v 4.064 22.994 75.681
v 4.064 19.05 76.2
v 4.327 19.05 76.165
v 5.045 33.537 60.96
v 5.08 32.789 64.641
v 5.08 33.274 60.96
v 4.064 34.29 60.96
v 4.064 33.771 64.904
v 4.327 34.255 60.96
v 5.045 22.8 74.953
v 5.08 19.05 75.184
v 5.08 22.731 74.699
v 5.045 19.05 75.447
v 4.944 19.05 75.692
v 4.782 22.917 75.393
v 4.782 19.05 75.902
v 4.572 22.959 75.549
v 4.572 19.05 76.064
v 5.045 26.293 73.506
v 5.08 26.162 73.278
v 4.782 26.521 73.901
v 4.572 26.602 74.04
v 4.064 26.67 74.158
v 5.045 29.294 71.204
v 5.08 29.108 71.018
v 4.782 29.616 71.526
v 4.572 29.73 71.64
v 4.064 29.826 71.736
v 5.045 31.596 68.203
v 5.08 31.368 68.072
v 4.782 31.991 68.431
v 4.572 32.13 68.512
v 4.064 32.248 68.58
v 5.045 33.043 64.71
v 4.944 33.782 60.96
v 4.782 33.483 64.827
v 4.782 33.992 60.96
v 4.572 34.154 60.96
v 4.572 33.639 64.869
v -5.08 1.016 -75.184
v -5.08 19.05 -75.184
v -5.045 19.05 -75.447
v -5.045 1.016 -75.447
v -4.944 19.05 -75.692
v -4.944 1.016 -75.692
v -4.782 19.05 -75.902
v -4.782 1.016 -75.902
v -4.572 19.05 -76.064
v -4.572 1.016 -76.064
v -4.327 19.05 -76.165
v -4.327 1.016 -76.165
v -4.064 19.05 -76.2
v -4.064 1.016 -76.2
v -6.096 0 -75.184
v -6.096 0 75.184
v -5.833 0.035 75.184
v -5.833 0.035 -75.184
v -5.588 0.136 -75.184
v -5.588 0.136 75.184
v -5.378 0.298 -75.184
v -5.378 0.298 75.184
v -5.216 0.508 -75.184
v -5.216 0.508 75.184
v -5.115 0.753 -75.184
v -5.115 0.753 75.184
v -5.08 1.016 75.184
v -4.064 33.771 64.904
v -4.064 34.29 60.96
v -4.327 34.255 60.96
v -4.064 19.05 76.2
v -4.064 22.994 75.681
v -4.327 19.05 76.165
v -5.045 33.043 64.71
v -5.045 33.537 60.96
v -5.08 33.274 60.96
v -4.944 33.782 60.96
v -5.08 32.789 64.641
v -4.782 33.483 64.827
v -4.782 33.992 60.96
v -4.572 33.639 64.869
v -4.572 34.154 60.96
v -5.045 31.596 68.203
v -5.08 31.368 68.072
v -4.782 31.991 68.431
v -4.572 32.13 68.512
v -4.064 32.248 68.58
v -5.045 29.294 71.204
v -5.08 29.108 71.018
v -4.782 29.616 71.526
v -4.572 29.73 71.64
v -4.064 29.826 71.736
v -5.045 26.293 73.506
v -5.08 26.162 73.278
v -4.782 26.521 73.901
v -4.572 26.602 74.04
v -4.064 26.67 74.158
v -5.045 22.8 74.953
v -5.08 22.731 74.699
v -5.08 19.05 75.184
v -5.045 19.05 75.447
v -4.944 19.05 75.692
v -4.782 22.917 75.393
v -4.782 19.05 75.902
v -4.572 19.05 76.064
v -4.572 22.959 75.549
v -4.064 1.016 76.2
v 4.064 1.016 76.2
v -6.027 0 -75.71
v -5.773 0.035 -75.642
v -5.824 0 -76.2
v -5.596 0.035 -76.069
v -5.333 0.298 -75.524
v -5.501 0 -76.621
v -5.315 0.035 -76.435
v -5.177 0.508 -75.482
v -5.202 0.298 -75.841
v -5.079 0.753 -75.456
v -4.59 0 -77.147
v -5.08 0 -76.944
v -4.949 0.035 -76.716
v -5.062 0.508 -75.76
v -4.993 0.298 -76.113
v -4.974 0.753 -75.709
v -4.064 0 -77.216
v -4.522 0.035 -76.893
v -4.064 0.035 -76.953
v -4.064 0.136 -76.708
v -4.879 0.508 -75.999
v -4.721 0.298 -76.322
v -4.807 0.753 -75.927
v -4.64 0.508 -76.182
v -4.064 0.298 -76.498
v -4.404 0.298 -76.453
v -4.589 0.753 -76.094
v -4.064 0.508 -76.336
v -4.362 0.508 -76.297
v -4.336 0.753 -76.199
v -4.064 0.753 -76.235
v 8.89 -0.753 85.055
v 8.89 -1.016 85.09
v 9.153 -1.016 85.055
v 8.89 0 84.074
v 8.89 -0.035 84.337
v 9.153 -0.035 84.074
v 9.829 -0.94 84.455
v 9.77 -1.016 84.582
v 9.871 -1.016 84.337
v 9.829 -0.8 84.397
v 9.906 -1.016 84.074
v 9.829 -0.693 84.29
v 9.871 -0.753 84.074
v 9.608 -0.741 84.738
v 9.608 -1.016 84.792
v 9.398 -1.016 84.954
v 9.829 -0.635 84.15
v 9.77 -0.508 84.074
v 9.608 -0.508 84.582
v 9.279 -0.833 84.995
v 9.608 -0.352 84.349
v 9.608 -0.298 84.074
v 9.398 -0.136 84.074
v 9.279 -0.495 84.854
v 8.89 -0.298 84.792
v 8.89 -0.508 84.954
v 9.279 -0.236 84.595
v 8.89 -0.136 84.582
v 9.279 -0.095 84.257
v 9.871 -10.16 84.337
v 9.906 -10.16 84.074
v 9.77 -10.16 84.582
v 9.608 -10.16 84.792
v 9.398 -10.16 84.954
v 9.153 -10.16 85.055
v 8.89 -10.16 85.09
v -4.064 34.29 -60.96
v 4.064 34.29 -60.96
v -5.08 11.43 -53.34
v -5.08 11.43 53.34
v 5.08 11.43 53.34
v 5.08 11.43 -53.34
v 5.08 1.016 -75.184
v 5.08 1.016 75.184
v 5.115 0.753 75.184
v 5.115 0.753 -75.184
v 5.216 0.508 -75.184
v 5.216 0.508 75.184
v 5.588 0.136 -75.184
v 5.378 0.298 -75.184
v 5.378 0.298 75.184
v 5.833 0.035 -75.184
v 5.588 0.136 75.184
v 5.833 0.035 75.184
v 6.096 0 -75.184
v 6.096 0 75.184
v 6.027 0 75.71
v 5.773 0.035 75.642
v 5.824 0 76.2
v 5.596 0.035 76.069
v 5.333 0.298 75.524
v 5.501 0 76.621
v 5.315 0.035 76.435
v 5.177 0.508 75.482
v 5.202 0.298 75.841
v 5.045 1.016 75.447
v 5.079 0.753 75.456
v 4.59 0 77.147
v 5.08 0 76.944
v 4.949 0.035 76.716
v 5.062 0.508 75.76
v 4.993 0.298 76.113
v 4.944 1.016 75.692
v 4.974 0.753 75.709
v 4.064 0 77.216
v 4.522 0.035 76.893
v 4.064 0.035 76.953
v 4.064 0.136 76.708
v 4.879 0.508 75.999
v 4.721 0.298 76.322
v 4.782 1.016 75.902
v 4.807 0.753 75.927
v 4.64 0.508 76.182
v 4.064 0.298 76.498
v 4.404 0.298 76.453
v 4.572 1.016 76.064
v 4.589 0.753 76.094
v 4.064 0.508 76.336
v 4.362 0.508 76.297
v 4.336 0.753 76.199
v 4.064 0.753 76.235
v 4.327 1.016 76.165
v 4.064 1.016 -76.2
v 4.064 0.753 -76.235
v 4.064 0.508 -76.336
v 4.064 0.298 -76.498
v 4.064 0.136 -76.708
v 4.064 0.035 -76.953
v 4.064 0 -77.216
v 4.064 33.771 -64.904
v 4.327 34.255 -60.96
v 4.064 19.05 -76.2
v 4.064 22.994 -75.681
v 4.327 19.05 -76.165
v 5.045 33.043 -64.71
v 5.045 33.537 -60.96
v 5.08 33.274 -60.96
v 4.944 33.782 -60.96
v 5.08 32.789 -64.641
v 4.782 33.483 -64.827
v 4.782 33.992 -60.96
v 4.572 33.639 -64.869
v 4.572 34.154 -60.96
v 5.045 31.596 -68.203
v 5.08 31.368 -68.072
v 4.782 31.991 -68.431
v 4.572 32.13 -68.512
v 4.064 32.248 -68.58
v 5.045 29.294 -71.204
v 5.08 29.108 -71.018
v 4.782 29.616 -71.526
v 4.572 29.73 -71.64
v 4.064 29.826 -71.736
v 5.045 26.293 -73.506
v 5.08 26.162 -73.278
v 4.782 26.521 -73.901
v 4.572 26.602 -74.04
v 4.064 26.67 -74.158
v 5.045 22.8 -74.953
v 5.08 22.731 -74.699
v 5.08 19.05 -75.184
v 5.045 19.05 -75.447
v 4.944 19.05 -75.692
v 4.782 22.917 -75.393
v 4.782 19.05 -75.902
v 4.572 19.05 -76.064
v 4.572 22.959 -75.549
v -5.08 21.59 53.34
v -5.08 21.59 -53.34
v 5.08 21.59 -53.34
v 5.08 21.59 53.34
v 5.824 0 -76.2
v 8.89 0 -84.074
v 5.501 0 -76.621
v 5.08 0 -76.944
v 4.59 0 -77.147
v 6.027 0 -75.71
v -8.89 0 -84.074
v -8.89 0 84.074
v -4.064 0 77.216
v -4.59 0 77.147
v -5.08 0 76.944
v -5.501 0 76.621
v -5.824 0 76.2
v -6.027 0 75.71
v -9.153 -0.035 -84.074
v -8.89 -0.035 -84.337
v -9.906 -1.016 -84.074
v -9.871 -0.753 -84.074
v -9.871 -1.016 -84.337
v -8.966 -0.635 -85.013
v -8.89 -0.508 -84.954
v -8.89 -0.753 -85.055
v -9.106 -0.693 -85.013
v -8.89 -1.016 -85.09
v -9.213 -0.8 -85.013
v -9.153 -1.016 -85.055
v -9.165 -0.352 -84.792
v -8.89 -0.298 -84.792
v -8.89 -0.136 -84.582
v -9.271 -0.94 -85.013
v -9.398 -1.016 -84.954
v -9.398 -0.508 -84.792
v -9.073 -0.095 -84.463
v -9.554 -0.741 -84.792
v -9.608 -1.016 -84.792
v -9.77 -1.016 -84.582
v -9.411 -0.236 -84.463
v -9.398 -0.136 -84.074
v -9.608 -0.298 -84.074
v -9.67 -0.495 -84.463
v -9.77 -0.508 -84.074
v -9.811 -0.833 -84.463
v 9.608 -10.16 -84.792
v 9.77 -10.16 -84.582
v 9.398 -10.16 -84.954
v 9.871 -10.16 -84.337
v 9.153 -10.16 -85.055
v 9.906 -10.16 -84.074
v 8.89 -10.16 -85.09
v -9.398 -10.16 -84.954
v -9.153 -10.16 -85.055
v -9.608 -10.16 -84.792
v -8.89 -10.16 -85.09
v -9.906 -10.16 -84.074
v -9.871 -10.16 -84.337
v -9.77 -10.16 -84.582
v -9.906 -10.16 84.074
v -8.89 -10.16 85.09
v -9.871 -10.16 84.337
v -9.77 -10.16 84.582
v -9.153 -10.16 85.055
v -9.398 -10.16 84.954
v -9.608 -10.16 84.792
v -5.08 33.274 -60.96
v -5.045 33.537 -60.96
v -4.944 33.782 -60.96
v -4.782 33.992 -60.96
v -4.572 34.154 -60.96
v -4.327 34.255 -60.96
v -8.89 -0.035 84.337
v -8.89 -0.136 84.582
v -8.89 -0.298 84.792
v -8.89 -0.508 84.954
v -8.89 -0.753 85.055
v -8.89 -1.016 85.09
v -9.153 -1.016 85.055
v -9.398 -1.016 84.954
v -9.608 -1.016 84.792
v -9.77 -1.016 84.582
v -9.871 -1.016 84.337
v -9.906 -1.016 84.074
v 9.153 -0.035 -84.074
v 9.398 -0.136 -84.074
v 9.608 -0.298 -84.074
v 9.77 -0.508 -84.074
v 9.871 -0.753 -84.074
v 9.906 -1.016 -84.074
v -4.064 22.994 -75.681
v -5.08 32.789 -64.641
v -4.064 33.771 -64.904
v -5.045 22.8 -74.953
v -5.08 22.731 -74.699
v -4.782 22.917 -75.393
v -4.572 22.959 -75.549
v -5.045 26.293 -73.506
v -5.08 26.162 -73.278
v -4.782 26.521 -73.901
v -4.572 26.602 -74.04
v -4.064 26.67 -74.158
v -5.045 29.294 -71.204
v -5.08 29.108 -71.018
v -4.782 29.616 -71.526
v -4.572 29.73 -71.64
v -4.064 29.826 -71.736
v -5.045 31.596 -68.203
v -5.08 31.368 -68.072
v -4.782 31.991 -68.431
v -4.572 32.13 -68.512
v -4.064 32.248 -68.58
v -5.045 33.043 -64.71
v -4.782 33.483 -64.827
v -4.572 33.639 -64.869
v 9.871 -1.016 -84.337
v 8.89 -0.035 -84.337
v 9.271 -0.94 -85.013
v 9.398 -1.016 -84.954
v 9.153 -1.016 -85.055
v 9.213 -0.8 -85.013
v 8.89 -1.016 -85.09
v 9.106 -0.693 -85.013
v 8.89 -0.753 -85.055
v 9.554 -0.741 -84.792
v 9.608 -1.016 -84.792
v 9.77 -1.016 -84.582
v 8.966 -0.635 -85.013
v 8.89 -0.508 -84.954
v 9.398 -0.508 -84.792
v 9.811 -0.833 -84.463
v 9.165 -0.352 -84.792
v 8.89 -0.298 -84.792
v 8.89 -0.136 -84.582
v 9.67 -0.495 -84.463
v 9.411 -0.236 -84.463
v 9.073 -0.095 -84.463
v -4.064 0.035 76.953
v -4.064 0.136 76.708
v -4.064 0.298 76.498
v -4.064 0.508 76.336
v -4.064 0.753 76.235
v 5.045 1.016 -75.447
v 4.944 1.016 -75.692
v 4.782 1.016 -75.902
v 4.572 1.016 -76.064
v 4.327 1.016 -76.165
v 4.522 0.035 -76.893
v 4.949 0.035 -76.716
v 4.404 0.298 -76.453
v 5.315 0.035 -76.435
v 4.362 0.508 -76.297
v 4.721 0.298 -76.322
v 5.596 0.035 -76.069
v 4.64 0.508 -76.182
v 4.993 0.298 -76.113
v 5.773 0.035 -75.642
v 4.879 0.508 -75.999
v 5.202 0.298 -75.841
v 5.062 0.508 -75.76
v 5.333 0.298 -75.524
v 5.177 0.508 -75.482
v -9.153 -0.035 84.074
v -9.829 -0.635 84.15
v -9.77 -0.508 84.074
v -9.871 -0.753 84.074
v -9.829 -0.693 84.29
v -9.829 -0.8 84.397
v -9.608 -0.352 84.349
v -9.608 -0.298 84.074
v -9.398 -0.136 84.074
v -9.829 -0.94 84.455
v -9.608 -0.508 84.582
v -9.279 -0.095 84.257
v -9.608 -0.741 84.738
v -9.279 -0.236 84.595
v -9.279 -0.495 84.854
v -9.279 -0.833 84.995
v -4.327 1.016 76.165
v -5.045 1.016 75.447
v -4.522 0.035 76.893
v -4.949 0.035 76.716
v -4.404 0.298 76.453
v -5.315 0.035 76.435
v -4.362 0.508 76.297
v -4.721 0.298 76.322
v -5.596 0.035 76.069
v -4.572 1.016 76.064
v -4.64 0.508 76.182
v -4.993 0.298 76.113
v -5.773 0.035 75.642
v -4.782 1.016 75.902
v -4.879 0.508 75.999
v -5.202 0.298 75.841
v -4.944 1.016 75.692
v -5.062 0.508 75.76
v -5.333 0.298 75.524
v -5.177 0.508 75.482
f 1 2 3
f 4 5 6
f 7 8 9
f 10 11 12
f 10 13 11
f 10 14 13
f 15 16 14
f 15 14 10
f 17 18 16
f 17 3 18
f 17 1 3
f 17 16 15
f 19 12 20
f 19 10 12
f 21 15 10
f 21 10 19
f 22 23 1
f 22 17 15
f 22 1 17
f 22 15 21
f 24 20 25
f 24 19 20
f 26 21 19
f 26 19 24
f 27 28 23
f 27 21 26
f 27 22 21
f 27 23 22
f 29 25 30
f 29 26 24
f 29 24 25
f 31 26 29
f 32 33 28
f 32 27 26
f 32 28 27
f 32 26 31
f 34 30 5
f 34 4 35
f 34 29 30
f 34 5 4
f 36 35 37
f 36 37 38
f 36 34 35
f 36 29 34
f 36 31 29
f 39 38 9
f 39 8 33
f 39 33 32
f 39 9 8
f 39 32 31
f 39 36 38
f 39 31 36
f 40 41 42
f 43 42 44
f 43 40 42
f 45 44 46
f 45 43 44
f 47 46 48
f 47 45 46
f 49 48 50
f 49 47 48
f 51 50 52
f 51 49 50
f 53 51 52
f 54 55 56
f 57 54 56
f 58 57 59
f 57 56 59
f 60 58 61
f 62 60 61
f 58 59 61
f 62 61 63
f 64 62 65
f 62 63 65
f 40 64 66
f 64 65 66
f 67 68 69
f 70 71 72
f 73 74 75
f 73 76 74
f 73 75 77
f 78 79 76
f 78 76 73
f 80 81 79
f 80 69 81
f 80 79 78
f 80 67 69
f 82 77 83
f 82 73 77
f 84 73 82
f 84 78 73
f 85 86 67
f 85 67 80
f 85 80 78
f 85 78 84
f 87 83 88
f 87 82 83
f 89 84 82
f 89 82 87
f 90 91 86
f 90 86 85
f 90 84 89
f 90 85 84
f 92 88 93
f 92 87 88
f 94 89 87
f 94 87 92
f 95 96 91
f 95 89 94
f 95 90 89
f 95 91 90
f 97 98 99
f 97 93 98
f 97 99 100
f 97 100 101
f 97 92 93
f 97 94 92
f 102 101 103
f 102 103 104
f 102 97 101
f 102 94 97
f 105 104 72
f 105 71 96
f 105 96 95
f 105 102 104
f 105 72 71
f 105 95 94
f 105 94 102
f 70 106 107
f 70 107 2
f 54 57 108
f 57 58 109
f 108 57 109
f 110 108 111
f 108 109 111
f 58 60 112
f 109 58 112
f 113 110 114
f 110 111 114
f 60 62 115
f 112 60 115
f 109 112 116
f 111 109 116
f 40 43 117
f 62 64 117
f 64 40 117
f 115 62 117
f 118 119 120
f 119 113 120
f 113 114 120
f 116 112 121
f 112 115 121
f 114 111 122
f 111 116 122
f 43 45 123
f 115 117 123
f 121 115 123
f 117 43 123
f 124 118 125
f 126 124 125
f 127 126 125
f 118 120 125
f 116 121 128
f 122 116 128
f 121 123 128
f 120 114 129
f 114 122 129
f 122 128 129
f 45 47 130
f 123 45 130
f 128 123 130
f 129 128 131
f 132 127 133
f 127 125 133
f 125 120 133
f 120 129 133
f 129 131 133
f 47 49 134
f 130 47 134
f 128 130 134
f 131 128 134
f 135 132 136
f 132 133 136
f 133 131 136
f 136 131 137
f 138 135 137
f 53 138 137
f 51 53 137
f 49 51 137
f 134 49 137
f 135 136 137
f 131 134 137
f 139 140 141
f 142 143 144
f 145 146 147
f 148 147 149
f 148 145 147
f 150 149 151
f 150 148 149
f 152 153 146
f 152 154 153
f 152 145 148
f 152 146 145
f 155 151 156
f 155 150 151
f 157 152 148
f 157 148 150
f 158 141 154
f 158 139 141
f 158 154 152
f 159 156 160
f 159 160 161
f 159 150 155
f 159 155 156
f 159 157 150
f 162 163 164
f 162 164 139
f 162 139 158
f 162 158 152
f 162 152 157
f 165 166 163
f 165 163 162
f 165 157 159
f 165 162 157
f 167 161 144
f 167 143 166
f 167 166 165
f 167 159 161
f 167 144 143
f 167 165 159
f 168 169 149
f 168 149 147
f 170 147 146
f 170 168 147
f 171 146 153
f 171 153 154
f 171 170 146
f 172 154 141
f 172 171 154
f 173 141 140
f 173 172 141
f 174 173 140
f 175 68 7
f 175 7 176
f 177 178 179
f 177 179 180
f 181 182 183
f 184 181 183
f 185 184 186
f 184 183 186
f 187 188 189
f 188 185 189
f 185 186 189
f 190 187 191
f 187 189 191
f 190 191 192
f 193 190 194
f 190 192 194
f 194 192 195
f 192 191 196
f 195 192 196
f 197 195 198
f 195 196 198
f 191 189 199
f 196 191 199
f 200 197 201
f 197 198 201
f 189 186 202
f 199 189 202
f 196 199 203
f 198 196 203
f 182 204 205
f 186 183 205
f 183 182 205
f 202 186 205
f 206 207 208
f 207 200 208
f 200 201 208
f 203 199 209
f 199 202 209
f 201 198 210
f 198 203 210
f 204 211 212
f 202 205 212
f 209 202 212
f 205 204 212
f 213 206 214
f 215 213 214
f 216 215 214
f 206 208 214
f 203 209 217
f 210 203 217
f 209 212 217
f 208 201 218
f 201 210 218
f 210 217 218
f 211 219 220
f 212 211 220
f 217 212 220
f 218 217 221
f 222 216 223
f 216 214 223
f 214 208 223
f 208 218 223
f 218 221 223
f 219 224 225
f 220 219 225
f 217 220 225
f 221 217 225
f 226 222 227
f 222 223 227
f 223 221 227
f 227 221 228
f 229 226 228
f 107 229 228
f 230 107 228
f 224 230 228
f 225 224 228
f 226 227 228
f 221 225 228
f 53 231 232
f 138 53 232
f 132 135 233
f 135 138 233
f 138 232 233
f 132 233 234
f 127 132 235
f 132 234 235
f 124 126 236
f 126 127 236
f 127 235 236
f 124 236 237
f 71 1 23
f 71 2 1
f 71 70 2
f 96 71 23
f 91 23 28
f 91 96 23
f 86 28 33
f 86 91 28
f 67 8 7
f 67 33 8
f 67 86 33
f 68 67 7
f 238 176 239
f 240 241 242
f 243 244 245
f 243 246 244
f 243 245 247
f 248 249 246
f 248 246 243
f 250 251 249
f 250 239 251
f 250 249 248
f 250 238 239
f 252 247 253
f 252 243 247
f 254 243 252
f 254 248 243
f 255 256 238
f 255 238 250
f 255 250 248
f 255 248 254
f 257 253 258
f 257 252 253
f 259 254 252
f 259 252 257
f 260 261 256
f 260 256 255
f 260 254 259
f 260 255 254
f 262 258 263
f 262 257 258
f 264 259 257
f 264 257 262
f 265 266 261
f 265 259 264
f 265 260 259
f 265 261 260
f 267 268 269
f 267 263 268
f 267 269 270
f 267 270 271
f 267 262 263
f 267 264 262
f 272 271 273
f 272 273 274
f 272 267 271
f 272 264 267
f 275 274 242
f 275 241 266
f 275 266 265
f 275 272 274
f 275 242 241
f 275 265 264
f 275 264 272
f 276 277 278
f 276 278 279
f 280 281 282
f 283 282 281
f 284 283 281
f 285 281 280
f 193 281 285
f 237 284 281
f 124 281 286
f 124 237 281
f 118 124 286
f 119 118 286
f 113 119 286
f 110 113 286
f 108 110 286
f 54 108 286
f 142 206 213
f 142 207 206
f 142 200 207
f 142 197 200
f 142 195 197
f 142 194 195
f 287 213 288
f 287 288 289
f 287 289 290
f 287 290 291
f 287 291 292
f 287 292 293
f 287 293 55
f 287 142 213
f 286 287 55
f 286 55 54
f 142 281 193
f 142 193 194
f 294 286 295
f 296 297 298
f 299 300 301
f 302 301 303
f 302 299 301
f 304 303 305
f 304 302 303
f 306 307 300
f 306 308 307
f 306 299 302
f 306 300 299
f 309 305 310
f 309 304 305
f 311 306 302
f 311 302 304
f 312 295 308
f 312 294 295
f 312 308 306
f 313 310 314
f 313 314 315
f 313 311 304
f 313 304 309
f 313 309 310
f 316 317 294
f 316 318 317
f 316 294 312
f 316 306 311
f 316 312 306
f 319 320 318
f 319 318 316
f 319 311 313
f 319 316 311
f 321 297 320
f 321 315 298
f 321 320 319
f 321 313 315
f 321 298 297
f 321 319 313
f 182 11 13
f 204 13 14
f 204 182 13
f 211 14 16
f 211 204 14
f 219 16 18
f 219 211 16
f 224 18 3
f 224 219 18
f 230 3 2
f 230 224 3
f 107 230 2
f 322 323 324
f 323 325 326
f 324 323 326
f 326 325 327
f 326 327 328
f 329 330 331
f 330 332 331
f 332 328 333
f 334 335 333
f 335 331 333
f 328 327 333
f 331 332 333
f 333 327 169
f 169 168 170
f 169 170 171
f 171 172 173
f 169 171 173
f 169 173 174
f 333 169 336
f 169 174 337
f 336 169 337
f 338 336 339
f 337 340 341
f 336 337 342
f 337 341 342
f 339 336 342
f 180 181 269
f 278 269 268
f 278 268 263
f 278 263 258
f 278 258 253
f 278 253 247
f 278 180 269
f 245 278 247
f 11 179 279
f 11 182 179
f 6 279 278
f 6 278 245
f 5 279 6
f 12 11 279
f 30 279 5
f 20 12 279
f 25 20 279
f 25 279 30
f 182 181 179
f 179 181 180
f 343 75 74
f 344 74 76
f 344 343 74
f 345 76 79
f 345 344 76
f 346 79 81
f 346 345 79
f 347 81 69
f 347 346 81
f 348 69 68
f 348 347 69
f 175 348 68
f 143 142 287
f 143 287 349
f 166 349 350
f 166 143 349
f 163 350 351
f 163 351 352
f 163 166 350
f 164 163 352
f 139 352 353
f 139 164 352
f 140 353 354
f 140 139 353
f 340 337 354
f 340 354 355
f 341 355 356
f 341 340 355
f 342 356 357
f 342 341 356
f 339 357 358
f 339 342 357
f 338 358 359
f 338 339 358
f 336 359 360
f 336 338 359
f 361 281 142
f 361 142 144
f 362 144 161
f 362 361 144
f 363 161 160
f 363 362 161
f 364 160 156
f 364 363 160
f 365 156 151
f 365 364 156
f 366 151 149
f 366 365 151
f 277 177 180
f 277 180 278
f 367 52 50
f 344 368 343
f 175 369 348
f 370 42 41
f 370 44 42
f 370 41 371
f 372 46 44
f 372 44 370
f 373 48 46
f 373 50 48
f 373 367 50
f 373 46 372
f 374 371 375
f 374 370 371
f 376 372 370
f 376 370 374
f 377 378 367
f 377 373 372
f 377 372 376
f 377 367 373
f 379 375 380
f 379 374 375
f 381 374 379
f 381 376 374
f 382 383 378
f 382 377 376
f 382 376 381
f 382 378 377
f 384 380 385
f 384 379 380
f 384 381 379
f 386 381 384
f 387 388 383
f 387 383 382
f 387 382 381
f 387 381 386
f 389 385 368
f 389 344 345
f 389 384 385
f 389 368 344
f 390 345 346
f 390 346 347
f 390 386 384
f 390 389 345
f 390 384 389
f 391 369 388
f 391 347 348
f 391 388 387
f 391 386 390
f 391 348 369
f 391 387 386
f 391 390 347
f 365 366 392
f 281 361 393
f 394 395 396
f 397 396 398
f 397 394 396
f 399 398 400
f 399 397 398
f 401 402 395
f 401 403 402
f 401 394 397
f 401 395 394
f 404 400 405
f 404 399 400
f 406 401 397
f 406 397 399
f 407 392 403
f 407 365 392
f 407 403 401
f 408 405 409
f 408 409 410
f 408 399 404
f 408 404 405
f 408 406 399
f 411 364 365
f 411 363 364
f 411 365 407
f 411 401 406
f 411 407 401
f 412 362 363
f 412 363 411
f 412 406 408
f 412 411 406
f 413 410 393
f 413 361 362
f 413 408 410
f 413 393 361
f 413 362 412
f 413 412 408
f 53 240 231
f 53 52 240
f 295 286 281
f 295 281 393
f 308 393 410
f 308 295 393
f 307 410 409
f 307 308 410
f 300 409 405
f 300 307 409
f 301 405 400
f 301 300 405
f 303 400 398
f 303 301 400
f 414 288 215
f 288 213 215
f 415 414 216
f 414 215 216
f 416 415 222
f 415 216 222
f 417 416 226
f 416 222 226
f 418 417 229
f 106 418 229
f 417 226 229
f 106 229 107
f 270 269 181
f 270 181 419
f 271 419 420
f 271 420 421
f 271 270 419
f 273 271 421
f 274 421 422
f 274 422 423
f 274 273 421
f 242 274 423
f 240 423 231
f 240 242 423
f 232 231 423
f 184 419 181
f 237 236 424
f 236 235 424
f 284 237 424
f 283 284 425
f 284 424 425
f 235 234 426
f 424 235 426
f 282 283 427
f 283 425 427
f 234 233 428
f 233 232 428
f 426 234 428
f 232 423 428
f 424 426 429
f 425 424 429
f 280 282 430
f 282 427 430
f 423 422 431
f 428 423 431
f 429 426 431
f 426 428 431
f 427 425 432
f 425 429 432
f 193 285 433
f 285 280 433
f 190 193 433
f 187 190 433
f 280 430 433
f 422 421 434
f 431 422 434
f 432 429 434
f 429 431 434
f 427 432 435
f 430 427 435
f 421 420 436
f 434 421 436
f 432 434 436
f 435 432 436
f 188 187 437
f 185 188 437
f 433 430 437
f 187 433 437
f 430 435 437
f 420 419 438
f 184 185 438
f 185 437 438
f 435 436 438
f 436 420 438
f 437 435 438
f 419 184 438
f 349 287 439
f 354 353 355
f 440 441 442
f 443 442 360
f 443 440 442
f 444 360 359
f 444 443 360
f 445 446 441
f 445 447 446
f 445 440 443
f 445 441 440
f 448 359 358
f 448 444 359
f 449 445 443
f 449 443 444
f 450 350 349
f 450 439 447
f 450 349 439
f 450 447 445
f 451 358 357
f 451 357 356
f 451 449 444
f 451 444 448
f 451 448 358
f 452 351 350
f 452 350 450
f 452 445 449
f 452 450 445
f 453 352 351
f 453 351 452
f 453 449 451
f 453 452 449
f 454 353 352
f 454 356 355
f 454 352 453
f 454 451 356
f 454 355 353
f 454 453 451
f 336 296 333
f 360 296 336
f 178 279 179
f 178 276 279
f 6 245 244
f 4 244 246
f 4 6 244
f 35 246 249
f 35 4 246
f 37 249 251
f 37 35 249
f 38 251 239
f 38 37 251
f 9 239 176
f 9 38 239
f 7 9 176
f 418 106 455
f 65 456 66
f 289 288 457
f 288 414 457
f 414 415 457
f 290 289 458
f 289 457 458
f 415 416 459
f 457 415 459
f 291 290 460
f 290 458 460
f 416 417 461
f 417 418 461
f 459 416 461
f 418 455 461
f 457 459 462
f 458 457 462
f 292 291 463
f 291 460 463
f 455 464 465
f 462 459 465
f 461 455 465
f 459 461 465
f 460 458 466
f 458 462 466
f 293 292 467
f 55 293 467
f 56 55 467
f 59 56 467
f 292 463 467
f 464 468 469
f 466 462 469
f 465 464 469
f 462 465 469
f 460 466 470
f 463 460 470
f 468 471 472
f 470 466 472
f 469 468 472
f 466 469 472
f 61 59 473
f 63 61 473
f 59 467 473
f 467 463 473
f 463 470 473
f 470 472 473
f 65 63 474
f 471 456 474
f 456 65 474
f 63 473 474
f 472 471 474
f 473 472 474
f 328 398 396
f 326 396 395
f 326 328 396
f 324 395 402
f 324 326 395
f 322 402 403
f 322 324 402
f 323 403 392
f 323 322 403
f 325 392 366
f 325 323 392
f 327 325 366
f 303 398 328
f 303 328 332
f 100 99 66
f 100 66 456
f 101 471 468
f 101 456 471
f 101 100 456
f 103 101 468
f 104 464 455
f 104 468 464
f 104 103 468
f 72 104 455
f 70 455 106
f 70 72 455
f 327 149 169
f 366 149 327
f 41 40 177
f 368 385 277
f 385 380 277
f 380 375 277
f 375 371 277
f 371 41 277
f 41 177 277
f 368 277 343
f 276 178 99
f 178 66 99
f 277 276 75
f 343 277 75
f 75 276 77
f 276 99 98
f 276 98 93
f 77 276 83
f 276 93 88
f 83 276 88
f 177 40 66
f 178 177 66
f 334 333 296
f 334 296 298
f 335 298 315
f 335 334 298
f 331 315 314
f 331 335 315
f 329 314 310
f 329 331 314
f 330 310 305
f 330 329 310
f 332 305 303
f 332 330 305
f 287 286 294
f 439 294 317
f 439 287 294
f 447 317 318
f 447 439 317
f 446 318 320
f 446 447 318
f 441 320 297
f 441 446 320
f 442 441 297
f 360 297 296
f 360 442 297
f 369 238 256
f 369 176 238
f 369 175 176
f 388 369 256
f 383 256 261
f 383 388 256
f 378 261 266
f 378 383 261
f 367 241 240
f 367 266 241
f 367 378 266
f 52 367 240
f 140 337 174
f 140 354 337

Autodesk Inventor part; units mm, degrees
ref_plane "YZ Plane" through (0, 0, 0) normal (1, 0, 0) x (0, 1, 0)
ref_plane "XZ Plane" through (0, 0, 0) normal (0, 1, 0) x (-1, 0, 0)
ref_plane "XY Plane" through (0, 0, 0) normal (0, 0, 1) x (1, 0, 0)
sketch "Sketch1" plane through (0, 0, 0) normal (1, 0, 0) x (0, 1, 0)
  line L0 (0, 76.2) -> (19.05, 76.2)
  line L1 (34.29, 60.96) -> (34.29, -60.96)
  line L2 (19.05, -76.2) -> (0, -76.2)
  line L3 (0, -76.2) -> (0, 76.2)
  line L4 (21.59, 53.34) -> (11.43, 53.34)
  line L5 (11.43, 53.34) -> (11.43, -53.34)
  line L6 (11.43, -53.34) -> (21.59, -53.34)
  line L7 (21.59, -53.34) -> (21.59, 53.34)
  line L8 (21.59, 53.34) -> (11.43, -53.34) construction
  line L9 (11.43, 53.34) -> (21.59, -53.34) construction
  arc A0 (34.29, 60.96) -> (19.05, 76.2) centre (19.05, 60.96) ccw
  arc A1 (19.05, -76.2) -> (34.29, -60.96) centre (19.05, -60.96) ccw
  line L10 (0, 0) -> (84.7989, 0) construction
  point P0 (16.51, 0)
  dimension "d0" = 15.24
  dimension "d1" = 152.4
  dimension "d2" = 106.68
  dimension "d3" = 34.29
  dimension "d4" = 11.43
  dimension "d5" = 10.16
extrude "Extrusion1" add sketch "Sketch1" along normal mid plane 10.16
sketch "Sketch3" plane through (0, 0, 0) normal (0, 1, 0) x (-1, 0, 0)
  line L0 (9.906, 85.09) -> (-9.906, 85.09)
  line L1 (-9.906, 85.09) -> (-9.906, -85.09)
  line L2 (-9.906, -85.09) -> (9.906, -85.09)
  line L3 (9.906, -85.09) -> (9.906, 85.09)
  line L4 (9.906, 85.09) -> (-9.906, -85.09) construction
  line L5 (-9.906, 85.09) -> (9.906, -85.09) construction
  point P0 (0, 0)
  dimension "d8" = 170.18
  dimension "d9" = 19.812
extrude "Extrusion2" add sketch "Sketch3" against normal blind 10.16
fillet "Fillet1" radius 1.016 22 edges at (5.08, 29.8263, 71.7363) (5.08, 9.525, 76.2) (5.08, 29.8263, -71.7363) (5.08, 9.525, -76.2) (5.08, 34.29, 0) (-5.08, 34.29, 0) (-5.08, 29.8263, -71.7363) (-5.08, 9.525, -76.2) (-5.08, 9.525, 76.2) (-5.08, 29.8263, 71.7363) (0, 0, 76.2) (5.08, 0, 0) (0, 0, -76.2) (-5.08, 0, 0) (0, 0, 85.09) (9.906, 0, 0) (-9.906, 0, 0) (9.906, -5.08, 85.09) (-9.906, -5.08, 85.09) (9.906, -5.08, -85.09) (0, 0, -85.09) (-9.906, -5.08, -85.09)
properties part number "Base"
